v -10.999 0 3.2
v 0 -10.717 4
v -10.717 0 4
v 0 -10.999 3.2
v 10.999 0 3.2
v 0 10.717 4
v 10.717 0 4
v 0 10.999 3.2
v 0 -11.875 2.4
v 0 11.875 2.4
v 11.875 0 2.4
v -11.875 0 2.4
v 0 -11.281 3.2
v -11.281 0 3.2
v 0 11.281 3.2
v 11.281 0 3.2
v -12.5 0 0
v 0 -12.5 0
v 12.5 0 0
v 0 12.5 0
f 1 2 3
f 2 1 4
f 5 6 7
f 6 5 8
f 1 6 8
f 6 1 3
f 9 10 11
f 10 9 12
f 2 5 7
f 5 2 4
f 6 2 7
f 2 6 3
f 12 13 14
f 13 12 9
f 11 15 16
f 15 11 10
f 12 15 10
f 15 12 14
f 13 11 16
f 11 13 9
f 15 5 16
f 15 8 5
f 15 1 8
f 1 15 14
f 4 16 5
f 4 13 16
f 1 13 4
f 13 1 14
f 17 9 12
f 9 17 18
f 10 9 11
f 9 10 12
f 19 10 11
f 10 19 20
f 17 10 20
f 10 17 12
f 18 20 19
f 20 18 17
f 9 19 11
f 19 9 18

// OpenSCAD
// file: ../build.scad
$build_id = "";

function building(filename) = is_undef(filename) ?
  !is_undef(build)
  : !is_undef(build) && build == filename;

function previewing() = !building();

module build(filename) {
  $build_id = filename;

  if(!is_undef(scad_build_scan) && scad_build_scan == true) {
    echo(str("scad_build_scan: ", filename));
  }
  else if(previewing() || build == filename) {
    children();
  }
}

module preview_row(spacing) {
  if(previewing()) {
    for(x = [0:1:$children - 1]) {
      translate([x * spacing, 0, 0]) {
        children(x);
      }
    }
  }
  else {
    children();
  }
}

module preview_column(spacing) {
  if(previewing()) {
    for(y = [0:1:$children - 1]) {
      translate([0, y * spacing, 0]) {
        children(y);
      }
    }
  }
  else {
    children();
  }
}
// file: ../minibase.scad
// Based off of titancraft's Customizable Miniature Base (CC0 1.0)
// https://www.thingiverse.com/thing:1112237

include <./build.scad>

$base_rim = 1; //	[1: tapered, 2: inclined, 3: flat]
// Number of sides:
$base_shape = 100; //	[30:Low-res Circle, 100: Hi-res Circle, 5:Pentagon, 6:Hexagon, 8:Octagon, 4:Square, 3:Triangle]

$base_diameter = 32;
$base_height = 4;
$base_slant = 95;

// Percentage:
$base_stretch = 100;

//(tapered base only)
$base_inner_circle_ratio = 40;

module tapered(r=40) {
  $base_rim = 1;
  $base_inner_circle_ratio = r;

  children();
}

module inclined() {
  $base_rim = 2;

  children();
}

module flat() {
  $base_rim = 3;

  children();
}

module shape(s) {
  $base_shape = s;

  children();
}

module diameter(d) {
  $base_diameter = d;

  children();
}

module height(h) {
  $base_height = h;

  children();
}

module slant(s) {
  $base_slant = s;

  children();
}

module stretch(s) {
  $base_stretch = s;

  children();
}

module base(id) {
  build(id) union() {
    radius = $base_diameter/2;
    scale([$base_stretch/100, 1, 1]){
      if ($base_rim == 1){
        // tapered base
        cyl1_height = $base_height * (1-$base_inner_circle_ratio/100);
        cylinder(cyl1_height, radius, radius * $base_slant/100, $fn=$base_shape);

        cyl2_radius = radius  * $base_slant/100 * .95;
        cyl2_height = $base_height - cyl1_height;

        translate([0, 0, cyl1_height]){
          cylinder(cyl2_height, cyl2_radius, cyl2_radius * $base_slant/100, $fn=$base_shape);
          cylinder(cyl2_height*.5, radius * $base_slant/100, cyl2_radius, $fn=$base_shape);
        }
      } else if ($base_rim == 2){
        // inclined base
        cylinder($base_height, radius, radius * $base_slant/100, $fn=$base_shape);
      } else if ($base_rim == 3){
        // flat base

        cylinder($base_height, radius, radius, $fn=$base_shape);
      }
    }
  }
}
// main file
include <../minibase.scad>

tapered() diameter(25) shape(4) base("25mm-square");
